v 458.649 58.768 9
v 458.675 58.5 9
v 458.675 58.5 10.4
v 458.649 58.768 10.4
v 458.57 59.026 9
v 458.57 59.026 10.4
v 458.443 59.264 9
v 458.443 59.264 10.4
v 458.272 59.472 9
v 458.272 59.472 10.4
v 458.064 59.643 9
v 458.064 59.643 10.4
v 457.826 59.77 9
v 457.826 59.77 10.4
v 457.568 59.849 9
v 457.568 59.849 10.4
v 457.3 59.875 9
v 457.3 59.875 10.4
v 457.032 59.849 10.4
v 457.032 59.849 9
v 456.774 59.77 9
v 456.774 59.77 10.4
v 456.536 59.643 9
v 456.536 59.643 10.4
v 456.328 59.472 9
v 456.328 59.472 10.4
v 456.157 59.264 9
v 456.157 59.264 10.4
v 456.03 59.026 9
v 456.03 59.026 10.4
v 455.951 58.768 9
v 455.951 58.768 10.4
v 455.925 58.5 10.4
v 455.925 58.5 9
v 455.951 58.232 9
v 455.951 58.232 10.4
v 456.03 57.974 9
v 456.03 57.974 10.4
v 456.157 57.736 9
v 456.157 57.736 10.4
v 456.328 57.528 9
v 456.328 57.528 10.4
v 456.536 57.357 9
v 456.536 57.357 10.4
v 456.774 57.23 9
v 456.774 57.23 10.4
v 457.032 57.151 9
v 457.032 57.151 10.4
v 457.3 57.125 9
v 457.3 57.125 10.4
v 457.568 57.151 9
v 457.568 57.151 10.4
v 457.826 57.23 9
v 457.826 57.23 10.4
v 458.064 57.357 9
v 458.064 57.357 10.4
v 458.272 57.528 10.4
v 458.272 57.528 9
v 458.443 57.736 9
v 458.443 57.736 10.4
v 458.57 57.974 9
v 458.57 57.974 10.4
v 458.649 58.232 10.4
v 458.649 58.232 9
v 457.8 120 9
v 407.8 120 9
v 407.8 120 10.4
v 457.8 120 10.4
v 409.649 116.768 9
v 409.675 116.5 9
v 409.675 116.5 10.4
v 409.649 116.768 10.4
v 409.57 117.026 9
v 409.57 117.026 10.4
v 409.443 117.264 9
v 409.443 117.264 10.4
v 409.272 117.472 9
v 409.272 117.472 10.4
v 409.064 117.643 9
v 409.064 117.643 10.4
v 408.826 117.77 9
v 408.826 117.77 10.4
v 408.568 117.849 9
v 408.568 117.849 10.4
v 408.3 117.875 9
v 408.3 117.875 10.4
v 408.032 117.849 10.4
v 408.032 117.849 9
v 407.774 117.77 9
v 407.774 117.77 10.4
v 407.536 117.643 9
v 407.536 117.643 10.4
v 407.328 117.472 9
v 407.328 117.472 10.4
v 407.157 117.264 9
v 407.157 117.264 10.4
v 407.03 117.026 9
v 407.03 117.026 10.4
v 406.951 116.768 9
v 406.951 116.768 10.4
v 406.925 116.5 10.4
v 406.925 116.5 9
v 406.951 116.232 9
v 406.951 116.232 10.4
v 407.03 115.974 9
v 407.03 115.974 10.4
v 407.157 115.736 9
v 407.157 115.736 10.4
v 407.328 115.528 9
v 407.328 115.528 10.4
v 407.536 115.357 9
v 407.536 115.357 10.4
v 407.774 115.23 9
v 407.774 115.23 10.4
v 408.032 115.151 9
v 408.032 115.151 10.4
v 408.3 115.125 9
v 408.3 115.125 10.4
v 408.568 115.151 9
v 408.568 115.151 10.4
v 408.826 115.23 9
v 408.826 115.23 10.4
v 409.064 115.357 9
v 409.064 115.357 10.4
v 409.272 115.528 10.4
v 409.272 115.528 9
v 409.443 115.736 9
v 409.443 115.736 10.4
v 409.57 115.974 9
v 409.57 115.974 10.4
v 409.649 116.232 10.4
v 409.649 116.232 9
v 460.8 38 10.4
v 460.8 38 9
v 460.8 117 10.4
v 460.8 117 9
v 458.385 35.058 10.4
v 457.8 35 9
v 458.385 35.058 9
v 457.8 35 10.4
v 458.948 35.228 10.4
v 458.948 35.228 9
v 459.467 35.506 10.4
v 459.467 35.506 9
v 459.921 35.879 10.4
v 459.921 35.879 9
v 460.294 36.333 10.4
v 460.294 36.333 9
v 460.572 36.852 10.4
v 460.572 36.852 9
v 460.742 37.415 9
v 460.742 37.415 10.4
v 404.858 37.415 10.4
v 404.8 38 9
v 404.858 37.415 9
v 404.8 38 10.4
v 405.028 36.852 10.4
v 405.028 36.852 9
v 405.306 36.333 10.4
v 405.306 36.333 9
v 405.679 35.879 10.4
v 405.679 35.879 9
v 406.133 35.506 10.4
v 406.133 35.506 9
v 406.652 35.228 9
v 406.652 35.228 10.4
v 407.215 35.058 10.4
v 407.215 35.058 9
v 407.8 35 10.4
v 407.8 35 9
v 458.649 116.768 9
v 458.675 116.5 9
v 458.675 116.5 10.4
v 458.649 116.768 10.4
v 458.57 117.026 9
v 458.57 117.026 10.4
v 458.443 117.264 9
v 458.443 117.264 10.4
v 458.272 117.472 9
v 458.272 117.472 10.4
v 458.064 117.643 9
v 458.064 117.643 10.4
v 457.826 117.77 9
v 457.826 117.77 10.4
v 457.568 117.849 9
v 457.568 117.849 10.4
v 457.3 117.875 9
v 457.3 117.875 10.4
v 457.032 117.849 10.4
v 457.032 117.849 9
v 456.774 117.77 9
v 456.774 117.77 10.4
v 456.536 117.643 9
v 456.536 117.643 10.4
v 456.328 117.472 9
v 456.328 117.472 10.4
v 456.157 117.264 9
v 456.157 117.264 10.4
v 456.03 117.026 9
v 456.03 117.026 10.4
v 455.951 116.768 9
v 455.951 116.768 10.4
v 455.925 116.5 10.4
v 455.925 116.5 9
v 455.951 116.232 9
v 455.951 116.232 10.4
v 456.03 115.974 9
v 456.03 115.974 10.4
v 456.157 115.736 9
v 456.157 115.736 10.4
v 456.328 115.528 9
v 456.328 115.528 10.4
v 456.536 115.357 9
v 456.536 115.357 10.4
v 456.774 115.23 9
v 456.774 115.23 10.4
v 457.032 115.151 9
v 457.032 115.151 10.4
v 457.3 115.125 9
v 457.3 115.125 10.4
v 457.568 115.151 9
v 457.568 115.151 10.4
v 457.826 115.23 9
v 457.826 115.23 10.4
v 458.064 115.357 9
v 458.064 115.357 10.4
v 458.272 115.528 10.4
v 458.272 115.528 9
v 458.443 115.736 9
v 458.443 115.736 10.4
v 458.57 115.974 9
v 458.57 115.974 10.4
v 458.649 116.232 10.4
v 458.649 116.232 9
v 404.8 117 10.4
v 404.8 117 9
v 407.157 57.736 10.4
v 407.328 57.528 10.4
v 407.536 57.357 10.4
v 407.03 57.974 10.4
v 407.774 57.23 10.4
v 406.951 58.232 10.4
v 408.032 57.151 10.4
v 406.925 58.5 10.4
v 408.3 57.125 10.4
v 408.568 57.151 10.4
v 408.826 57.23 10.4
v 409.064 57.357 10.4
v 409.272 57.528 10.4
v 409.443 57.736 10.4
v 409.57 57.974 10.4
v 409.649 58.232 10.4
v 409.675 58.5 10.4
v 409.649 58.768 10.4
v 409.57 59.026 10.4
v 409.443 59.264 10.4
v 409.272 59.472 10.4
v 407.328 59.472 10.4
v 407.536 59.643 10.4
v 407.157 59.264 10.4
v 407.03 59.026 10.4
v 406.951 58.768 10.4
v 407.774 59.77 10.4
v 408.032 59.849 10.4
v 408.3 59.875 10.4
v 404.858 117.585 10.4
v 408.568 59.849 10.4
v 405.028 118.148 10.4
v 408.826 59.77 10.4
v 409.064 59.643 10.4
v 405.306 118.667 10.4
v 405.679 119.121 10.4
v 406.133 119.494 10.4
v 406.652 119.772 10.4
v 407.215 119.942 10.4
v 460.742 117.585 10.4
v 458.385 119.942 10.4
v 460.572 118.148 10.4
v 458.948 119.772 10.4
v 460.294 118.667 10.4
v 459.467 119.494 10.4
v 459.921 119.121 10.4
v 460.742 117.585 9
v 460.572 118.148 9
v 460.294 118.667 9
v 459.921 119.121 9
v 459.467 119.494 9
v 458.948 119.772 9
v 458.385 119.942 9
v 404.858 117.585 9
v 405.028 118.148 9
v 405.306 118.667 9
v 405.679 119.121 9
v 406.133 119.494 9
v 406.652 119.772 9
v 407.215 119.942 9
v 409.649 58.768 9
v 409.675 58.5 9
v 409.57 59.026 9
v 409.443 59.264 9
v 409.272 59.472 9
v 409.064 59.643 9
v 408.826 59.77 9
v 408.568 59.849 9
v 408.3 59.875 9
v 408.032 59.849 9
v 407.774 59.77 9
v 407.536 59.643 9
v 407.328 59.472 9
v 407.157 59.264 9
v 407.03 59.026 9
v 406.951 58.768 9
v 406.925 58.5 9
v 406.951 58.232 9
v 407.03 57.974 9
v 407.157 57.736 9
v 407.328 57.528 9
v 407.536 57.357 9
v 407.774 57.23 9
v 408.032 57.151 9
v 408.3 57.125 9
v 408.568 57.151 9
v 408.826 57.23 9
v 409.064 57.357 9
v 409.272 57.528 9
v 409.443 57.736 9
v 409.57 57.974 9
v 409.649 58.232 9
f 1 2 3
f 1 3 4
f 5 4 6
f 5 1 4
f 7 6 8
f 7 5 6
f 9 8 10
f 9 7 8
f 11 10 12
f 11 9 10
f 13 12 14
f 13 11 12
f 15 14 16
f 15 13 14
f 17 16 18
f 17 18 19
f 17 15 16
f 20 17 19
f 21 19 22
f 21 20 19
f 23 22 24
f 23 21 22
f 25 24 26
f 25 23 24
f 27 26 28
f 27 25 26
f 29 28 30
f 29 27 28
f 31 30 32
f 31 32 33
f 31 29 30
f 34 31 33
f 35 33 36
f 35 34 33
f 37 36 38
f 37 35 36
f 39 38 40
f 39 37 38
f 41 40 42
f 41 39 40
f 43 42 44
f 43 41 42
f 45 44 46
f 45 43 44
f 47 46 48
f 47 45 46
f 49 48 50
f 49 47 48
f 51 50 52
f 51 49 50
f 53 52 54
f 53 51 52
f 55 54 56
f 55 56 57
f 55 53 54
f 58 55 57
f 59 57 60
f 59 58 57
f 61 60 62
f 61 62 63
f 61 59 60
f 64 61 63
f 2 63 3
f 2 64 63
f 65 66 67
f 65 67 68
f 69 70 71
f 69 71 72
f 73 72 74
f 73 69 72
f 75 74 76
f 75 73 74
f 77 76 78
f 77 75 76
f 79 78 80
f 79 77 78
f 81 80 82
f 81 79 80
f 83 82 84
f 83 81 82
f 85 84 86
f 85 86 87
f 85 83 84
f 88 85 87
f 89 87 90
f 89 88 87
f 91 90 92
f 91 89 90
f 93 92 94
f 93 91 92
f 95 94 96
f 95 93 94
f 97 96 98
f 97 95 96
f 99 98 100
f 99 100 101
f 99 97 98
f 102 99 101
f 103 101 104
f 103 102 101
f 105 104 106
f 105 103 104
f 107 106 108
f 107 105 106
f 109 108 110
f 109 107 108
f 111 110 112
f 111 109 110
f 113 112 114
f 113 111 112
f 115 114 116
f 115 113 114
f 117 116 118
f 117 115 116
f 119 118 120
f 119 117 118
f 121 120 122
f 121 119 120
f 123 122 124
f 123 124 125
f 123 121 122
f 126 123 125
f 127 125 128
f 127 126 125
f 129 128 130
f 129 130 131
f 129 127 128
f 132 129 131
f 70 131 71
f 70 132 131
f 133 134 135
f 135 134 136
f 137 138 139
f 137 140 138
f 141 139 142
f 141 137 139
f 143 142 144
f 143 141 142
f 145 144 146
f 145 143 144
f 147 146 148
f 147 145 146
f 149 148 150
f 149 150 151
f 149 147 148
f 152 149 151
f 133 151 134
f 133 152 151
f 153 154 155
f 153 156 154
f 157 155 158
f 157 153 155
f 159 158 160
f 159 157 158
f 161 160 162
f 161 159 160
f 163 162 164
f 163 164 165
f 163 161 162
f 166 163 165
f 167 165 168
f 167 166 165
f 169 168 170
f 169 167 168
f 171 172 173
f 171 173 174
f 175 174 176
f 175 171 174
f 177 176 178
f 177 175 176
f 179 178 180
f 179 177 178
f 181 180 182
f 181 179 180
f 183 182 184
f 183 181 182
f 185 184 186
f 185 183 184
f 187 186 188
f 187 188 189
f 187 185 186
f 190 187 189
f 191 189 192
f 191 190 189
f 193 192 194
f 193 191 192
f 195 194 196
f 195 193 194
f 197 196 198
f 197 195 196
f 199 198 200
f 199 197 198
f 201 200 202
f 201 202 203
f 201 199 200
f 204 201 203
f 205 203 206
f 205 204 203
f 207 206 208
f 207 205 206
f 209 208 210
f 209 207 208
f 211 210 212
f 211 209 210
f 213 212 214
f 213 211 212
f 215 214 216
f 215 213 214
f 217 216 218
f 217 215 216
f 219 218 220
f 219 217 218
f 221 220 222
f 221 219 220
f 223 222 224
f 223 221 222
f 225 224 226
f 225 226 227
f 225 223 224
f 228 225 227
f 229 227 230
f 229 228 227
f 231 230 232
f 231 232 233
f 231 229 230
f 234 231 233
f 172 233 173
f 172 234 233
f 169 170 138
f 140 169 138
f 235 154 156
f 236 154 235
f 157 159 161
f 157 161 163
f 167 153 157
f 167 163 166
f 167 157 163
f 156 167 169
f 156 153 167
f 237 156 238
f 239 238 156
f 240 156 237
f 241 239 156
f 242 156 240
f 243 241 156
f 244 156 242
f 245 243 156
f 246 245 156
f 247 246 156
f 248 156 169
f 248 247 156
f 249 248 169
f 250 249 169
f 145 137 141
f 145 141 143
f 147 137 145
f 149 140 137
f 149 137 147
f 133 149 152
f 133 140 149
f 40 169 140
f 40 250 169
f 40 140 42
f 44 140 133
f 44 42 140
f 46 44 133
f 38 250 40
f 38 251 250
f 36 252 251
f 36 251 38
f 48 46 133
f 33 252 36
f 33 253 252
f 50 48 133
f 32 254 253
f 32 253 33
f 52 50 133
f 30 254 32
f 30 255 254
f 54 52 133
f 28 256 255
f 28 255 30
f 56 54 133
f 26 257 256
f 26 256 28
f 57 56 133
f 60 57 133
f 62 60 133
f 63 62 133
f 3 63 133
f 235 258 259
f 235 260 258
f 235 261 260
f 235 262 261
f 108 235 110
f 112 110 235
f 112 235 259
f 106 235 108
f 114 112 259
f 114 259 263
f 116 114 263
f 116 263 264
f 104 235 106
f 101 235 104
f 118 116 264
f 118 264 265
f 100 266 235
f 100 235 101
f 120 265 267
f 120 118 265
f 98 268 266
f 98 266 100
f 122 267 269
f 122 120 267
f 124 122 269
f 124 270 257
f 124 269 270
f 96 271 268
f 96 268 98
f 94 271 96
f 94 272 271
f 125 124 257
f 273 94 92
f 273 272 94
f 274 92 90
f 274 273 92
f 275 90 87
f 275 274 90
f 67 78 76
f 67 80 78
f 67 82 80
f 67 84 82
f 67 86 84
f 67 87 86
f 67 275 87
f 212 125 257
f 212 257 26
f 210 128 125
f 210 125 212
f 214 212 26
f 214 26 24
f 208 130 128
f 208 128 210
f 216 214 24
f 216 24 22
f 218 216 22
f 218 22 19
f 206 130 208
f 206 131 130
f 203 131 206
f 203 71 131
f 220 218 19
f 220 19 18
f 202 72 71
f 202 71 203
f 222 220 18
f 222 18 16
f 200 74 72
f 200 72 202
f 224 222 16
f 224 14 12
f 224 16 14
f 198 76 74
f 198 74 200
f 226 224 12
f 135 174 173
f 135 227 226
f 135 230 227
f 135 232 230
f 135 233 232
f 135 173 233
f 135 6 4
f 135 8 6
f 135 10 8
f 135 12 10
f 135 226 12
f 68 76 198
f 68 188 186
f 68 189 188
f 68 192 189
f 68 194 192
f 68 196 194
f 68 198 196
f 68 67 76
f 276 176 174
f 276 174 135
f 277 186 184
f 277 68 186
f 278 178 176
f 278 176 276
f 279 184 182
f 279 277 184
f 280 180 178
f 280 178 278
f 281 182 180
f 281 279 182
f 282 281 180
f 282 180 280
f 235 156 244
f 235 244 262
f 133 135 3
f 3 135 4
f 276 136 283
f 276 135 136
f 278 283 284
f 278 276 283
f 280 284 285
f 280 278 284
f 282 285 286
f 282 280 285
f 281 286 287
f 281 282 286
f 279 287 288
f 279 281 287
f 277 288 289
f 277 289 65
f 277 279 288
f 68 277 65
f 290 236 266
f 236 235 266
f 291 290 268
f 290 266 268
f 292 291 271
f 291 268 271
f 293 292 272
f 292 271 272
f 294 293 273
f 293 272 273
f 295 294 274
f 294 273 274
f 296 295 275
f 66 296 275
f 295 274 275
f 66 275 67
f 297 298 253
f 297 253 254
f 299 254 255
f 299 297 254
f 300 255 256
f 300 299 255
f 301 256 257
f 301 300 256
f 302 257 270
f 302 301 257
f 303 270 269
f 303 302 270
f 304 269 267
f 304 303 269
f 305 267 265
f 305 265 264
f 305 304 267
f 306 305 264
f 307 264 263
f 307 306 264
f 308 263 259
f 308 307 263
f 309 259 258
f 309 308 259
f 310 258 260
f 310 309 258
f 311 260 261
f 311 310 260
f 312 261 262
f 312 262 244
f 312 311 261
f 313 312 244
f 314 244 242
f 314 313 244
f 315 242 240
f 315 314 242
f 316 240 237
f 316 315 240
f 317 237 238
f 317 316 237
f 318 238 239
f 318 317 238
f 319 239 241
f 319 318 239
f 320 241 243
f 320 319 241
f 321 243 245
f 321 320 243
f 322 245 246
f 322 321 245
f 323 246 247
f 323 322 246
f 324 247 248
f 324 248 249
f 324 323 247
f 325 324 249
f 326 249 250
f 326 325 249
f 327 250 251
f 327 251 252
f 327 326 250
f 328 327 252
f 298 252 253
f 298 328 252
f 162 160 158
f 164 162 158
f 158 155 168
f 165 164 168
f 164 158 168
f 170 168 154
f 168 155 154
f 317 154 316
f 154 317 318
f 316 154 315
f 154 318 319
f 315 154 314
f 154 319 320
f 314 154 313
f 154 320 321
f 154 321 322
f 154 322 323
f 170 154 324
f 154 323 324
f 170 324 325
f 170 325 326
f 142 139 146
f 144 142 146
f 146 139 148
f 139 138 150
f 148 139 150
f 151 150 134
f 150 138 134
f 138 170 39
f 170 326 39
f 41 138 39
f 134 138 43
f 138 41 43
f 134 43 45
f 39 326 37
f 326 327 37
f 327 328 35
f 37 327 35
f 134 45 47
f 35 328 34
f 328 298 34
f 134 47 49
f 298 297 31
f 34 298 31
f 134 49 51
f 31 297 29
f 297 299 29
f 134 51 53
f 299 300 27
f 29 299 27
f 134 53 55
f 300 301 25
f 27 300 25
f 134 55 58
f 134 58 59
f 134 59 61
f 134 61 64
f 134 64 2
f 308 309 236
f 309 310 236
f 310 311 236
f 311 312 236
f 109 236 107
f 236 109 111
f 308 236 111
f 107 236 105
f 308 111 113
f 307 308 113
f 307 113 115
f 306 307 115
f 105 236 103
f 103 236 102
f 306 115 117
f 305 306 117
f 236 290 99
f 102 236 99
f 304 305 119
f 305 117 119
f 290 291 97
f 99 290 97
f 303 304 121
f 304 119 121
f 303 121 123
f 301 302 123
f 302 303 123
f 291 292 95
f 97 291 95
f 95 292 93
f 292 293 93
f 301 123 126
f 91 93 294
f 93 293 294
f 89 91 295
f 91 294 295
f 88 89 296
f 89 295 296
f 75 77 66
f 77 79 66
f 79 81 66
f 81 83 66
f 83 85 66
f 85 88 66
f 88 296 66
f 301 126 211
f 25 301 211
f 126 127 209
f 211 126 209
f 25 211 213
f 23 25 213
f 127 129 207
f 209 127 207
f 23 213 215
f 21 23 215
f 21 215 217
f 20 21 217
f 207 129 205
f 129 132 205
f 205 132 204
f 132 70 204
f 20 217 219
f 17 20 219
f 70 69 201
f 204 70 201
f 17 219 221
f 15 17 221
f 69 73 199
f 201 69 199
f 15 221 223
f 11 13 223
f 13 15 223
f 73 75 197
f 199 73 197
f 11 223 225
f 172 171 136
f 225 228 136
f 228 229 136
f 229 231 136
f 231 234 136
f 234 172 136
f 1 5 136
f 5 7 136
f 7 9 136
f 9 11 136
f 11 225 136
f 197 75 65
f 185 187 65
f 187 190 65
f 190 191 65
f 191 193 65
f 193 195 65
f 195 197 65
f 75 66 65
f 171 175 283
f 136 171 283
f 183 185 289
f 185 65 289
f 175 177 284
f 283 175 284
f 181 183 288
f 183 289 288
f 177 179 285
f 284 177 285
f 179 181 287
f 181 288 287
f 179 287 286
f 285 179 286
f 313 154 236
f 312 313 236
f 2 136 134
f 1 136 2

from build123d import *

# Parameters (mm, degrees)
CYLINDER011_R     = 1.375
CYLINDER011_DEPTH = 1.4
CYLINDER012_R     = 1.375
CYLINDER012_DEPTH = 1.4
CYLINDER013_R     = 1.375
CYLINDER013_DEPTH = 1.4
CYLINDER010_R     = 1.375
CYLINDER010_DEPTH = 1.4
BOX006_W          = 56
BOX006_H          = 85
BOX006_DEPTH      = 1.4
FILLET002_R       = 3


with BuildPart() as cylinder011:
    # Cylinder011 → Cylinder011 (new body)
    with BuildSketch(Plane(origin=(52.5, 81.5, 9), x_dir=(1, 0, 0), z_dir=(0, 0, 1))):
        Circle(CYLINDER011_R)
    extrude(amount=CYLINDER011_DEPTH)


with BuildPart() as cylinder012:
    # Cylinder012 → Cylinder012 (new body)
    with BuildSketch(Plane(origin=(52.5, 23.5, 9), x_dir=(1, 0, 0), z_dir=(0, 0, 1))):
        Circle(CYLINDER012_R)
    extrude(amount=CYLINDER012_DEPTH)


with BuildPart() as cylinder013:
    # Cylinder013 → Cylinder013 (new body)
    with BuildSketch(Plane(origin=(3.5, 23.5, 9), x_dir=(1, 0, 0), z_dir=(0, 0, 1))):
        Circle(CYLINDER013_R)
    extrude(amount=CYLINDER013_DEPTH)


with BuildPart() as pi_board_holes:
    # Cylinder010 → Cylinder010 (new body)
    with BuildSketch(Plane(origin=(3.5, 81.5, 9), x_dir=(1, 0, 0), z_dir=(0, 0, 1))):
        Circle(CYLINDER010_R)
    extrude(amount=CYLINDER010_DEPTH)

    # Fusion003: union Cylinder011, Cylinder012, Cylinder013
    add(cylinder011.part)
    add(cylinder012.part)
    add(cylinder013.part)


with BuildPart() as pi_base_board:
    # Box006 → Box006 (new body)
    with BuildSketch(Plane.XY.offset(9)):
        with Locations((28, 42.5)):
            Rectangle(BOX006_W, BOX006_H)
    extrude(amount=BOX006_DEPTH)

    # Fillet002
    fillet002_edges = [pi_base_board.edges().sort_by_distance(p)[0] for p in [
        (0, 0, 9.7),
        (0, 85, 9.7),
        (56, 0, 9.7),
        (56, 85, 9.7),
    ]]
    fillet(fillet002_edges, radius=FILLET002_R)

    # Cut002: cut Pi Board Holes
    add(pi_board_holes.part, mode=Mode.SUBTRACT)


with BuildPart() as pi_base_board_1:
    # Cut002 placement: moved
    add(pi_base_board.part.moved(Location((404.8, 35, 0))))


solid = pi_base_board_1.part
